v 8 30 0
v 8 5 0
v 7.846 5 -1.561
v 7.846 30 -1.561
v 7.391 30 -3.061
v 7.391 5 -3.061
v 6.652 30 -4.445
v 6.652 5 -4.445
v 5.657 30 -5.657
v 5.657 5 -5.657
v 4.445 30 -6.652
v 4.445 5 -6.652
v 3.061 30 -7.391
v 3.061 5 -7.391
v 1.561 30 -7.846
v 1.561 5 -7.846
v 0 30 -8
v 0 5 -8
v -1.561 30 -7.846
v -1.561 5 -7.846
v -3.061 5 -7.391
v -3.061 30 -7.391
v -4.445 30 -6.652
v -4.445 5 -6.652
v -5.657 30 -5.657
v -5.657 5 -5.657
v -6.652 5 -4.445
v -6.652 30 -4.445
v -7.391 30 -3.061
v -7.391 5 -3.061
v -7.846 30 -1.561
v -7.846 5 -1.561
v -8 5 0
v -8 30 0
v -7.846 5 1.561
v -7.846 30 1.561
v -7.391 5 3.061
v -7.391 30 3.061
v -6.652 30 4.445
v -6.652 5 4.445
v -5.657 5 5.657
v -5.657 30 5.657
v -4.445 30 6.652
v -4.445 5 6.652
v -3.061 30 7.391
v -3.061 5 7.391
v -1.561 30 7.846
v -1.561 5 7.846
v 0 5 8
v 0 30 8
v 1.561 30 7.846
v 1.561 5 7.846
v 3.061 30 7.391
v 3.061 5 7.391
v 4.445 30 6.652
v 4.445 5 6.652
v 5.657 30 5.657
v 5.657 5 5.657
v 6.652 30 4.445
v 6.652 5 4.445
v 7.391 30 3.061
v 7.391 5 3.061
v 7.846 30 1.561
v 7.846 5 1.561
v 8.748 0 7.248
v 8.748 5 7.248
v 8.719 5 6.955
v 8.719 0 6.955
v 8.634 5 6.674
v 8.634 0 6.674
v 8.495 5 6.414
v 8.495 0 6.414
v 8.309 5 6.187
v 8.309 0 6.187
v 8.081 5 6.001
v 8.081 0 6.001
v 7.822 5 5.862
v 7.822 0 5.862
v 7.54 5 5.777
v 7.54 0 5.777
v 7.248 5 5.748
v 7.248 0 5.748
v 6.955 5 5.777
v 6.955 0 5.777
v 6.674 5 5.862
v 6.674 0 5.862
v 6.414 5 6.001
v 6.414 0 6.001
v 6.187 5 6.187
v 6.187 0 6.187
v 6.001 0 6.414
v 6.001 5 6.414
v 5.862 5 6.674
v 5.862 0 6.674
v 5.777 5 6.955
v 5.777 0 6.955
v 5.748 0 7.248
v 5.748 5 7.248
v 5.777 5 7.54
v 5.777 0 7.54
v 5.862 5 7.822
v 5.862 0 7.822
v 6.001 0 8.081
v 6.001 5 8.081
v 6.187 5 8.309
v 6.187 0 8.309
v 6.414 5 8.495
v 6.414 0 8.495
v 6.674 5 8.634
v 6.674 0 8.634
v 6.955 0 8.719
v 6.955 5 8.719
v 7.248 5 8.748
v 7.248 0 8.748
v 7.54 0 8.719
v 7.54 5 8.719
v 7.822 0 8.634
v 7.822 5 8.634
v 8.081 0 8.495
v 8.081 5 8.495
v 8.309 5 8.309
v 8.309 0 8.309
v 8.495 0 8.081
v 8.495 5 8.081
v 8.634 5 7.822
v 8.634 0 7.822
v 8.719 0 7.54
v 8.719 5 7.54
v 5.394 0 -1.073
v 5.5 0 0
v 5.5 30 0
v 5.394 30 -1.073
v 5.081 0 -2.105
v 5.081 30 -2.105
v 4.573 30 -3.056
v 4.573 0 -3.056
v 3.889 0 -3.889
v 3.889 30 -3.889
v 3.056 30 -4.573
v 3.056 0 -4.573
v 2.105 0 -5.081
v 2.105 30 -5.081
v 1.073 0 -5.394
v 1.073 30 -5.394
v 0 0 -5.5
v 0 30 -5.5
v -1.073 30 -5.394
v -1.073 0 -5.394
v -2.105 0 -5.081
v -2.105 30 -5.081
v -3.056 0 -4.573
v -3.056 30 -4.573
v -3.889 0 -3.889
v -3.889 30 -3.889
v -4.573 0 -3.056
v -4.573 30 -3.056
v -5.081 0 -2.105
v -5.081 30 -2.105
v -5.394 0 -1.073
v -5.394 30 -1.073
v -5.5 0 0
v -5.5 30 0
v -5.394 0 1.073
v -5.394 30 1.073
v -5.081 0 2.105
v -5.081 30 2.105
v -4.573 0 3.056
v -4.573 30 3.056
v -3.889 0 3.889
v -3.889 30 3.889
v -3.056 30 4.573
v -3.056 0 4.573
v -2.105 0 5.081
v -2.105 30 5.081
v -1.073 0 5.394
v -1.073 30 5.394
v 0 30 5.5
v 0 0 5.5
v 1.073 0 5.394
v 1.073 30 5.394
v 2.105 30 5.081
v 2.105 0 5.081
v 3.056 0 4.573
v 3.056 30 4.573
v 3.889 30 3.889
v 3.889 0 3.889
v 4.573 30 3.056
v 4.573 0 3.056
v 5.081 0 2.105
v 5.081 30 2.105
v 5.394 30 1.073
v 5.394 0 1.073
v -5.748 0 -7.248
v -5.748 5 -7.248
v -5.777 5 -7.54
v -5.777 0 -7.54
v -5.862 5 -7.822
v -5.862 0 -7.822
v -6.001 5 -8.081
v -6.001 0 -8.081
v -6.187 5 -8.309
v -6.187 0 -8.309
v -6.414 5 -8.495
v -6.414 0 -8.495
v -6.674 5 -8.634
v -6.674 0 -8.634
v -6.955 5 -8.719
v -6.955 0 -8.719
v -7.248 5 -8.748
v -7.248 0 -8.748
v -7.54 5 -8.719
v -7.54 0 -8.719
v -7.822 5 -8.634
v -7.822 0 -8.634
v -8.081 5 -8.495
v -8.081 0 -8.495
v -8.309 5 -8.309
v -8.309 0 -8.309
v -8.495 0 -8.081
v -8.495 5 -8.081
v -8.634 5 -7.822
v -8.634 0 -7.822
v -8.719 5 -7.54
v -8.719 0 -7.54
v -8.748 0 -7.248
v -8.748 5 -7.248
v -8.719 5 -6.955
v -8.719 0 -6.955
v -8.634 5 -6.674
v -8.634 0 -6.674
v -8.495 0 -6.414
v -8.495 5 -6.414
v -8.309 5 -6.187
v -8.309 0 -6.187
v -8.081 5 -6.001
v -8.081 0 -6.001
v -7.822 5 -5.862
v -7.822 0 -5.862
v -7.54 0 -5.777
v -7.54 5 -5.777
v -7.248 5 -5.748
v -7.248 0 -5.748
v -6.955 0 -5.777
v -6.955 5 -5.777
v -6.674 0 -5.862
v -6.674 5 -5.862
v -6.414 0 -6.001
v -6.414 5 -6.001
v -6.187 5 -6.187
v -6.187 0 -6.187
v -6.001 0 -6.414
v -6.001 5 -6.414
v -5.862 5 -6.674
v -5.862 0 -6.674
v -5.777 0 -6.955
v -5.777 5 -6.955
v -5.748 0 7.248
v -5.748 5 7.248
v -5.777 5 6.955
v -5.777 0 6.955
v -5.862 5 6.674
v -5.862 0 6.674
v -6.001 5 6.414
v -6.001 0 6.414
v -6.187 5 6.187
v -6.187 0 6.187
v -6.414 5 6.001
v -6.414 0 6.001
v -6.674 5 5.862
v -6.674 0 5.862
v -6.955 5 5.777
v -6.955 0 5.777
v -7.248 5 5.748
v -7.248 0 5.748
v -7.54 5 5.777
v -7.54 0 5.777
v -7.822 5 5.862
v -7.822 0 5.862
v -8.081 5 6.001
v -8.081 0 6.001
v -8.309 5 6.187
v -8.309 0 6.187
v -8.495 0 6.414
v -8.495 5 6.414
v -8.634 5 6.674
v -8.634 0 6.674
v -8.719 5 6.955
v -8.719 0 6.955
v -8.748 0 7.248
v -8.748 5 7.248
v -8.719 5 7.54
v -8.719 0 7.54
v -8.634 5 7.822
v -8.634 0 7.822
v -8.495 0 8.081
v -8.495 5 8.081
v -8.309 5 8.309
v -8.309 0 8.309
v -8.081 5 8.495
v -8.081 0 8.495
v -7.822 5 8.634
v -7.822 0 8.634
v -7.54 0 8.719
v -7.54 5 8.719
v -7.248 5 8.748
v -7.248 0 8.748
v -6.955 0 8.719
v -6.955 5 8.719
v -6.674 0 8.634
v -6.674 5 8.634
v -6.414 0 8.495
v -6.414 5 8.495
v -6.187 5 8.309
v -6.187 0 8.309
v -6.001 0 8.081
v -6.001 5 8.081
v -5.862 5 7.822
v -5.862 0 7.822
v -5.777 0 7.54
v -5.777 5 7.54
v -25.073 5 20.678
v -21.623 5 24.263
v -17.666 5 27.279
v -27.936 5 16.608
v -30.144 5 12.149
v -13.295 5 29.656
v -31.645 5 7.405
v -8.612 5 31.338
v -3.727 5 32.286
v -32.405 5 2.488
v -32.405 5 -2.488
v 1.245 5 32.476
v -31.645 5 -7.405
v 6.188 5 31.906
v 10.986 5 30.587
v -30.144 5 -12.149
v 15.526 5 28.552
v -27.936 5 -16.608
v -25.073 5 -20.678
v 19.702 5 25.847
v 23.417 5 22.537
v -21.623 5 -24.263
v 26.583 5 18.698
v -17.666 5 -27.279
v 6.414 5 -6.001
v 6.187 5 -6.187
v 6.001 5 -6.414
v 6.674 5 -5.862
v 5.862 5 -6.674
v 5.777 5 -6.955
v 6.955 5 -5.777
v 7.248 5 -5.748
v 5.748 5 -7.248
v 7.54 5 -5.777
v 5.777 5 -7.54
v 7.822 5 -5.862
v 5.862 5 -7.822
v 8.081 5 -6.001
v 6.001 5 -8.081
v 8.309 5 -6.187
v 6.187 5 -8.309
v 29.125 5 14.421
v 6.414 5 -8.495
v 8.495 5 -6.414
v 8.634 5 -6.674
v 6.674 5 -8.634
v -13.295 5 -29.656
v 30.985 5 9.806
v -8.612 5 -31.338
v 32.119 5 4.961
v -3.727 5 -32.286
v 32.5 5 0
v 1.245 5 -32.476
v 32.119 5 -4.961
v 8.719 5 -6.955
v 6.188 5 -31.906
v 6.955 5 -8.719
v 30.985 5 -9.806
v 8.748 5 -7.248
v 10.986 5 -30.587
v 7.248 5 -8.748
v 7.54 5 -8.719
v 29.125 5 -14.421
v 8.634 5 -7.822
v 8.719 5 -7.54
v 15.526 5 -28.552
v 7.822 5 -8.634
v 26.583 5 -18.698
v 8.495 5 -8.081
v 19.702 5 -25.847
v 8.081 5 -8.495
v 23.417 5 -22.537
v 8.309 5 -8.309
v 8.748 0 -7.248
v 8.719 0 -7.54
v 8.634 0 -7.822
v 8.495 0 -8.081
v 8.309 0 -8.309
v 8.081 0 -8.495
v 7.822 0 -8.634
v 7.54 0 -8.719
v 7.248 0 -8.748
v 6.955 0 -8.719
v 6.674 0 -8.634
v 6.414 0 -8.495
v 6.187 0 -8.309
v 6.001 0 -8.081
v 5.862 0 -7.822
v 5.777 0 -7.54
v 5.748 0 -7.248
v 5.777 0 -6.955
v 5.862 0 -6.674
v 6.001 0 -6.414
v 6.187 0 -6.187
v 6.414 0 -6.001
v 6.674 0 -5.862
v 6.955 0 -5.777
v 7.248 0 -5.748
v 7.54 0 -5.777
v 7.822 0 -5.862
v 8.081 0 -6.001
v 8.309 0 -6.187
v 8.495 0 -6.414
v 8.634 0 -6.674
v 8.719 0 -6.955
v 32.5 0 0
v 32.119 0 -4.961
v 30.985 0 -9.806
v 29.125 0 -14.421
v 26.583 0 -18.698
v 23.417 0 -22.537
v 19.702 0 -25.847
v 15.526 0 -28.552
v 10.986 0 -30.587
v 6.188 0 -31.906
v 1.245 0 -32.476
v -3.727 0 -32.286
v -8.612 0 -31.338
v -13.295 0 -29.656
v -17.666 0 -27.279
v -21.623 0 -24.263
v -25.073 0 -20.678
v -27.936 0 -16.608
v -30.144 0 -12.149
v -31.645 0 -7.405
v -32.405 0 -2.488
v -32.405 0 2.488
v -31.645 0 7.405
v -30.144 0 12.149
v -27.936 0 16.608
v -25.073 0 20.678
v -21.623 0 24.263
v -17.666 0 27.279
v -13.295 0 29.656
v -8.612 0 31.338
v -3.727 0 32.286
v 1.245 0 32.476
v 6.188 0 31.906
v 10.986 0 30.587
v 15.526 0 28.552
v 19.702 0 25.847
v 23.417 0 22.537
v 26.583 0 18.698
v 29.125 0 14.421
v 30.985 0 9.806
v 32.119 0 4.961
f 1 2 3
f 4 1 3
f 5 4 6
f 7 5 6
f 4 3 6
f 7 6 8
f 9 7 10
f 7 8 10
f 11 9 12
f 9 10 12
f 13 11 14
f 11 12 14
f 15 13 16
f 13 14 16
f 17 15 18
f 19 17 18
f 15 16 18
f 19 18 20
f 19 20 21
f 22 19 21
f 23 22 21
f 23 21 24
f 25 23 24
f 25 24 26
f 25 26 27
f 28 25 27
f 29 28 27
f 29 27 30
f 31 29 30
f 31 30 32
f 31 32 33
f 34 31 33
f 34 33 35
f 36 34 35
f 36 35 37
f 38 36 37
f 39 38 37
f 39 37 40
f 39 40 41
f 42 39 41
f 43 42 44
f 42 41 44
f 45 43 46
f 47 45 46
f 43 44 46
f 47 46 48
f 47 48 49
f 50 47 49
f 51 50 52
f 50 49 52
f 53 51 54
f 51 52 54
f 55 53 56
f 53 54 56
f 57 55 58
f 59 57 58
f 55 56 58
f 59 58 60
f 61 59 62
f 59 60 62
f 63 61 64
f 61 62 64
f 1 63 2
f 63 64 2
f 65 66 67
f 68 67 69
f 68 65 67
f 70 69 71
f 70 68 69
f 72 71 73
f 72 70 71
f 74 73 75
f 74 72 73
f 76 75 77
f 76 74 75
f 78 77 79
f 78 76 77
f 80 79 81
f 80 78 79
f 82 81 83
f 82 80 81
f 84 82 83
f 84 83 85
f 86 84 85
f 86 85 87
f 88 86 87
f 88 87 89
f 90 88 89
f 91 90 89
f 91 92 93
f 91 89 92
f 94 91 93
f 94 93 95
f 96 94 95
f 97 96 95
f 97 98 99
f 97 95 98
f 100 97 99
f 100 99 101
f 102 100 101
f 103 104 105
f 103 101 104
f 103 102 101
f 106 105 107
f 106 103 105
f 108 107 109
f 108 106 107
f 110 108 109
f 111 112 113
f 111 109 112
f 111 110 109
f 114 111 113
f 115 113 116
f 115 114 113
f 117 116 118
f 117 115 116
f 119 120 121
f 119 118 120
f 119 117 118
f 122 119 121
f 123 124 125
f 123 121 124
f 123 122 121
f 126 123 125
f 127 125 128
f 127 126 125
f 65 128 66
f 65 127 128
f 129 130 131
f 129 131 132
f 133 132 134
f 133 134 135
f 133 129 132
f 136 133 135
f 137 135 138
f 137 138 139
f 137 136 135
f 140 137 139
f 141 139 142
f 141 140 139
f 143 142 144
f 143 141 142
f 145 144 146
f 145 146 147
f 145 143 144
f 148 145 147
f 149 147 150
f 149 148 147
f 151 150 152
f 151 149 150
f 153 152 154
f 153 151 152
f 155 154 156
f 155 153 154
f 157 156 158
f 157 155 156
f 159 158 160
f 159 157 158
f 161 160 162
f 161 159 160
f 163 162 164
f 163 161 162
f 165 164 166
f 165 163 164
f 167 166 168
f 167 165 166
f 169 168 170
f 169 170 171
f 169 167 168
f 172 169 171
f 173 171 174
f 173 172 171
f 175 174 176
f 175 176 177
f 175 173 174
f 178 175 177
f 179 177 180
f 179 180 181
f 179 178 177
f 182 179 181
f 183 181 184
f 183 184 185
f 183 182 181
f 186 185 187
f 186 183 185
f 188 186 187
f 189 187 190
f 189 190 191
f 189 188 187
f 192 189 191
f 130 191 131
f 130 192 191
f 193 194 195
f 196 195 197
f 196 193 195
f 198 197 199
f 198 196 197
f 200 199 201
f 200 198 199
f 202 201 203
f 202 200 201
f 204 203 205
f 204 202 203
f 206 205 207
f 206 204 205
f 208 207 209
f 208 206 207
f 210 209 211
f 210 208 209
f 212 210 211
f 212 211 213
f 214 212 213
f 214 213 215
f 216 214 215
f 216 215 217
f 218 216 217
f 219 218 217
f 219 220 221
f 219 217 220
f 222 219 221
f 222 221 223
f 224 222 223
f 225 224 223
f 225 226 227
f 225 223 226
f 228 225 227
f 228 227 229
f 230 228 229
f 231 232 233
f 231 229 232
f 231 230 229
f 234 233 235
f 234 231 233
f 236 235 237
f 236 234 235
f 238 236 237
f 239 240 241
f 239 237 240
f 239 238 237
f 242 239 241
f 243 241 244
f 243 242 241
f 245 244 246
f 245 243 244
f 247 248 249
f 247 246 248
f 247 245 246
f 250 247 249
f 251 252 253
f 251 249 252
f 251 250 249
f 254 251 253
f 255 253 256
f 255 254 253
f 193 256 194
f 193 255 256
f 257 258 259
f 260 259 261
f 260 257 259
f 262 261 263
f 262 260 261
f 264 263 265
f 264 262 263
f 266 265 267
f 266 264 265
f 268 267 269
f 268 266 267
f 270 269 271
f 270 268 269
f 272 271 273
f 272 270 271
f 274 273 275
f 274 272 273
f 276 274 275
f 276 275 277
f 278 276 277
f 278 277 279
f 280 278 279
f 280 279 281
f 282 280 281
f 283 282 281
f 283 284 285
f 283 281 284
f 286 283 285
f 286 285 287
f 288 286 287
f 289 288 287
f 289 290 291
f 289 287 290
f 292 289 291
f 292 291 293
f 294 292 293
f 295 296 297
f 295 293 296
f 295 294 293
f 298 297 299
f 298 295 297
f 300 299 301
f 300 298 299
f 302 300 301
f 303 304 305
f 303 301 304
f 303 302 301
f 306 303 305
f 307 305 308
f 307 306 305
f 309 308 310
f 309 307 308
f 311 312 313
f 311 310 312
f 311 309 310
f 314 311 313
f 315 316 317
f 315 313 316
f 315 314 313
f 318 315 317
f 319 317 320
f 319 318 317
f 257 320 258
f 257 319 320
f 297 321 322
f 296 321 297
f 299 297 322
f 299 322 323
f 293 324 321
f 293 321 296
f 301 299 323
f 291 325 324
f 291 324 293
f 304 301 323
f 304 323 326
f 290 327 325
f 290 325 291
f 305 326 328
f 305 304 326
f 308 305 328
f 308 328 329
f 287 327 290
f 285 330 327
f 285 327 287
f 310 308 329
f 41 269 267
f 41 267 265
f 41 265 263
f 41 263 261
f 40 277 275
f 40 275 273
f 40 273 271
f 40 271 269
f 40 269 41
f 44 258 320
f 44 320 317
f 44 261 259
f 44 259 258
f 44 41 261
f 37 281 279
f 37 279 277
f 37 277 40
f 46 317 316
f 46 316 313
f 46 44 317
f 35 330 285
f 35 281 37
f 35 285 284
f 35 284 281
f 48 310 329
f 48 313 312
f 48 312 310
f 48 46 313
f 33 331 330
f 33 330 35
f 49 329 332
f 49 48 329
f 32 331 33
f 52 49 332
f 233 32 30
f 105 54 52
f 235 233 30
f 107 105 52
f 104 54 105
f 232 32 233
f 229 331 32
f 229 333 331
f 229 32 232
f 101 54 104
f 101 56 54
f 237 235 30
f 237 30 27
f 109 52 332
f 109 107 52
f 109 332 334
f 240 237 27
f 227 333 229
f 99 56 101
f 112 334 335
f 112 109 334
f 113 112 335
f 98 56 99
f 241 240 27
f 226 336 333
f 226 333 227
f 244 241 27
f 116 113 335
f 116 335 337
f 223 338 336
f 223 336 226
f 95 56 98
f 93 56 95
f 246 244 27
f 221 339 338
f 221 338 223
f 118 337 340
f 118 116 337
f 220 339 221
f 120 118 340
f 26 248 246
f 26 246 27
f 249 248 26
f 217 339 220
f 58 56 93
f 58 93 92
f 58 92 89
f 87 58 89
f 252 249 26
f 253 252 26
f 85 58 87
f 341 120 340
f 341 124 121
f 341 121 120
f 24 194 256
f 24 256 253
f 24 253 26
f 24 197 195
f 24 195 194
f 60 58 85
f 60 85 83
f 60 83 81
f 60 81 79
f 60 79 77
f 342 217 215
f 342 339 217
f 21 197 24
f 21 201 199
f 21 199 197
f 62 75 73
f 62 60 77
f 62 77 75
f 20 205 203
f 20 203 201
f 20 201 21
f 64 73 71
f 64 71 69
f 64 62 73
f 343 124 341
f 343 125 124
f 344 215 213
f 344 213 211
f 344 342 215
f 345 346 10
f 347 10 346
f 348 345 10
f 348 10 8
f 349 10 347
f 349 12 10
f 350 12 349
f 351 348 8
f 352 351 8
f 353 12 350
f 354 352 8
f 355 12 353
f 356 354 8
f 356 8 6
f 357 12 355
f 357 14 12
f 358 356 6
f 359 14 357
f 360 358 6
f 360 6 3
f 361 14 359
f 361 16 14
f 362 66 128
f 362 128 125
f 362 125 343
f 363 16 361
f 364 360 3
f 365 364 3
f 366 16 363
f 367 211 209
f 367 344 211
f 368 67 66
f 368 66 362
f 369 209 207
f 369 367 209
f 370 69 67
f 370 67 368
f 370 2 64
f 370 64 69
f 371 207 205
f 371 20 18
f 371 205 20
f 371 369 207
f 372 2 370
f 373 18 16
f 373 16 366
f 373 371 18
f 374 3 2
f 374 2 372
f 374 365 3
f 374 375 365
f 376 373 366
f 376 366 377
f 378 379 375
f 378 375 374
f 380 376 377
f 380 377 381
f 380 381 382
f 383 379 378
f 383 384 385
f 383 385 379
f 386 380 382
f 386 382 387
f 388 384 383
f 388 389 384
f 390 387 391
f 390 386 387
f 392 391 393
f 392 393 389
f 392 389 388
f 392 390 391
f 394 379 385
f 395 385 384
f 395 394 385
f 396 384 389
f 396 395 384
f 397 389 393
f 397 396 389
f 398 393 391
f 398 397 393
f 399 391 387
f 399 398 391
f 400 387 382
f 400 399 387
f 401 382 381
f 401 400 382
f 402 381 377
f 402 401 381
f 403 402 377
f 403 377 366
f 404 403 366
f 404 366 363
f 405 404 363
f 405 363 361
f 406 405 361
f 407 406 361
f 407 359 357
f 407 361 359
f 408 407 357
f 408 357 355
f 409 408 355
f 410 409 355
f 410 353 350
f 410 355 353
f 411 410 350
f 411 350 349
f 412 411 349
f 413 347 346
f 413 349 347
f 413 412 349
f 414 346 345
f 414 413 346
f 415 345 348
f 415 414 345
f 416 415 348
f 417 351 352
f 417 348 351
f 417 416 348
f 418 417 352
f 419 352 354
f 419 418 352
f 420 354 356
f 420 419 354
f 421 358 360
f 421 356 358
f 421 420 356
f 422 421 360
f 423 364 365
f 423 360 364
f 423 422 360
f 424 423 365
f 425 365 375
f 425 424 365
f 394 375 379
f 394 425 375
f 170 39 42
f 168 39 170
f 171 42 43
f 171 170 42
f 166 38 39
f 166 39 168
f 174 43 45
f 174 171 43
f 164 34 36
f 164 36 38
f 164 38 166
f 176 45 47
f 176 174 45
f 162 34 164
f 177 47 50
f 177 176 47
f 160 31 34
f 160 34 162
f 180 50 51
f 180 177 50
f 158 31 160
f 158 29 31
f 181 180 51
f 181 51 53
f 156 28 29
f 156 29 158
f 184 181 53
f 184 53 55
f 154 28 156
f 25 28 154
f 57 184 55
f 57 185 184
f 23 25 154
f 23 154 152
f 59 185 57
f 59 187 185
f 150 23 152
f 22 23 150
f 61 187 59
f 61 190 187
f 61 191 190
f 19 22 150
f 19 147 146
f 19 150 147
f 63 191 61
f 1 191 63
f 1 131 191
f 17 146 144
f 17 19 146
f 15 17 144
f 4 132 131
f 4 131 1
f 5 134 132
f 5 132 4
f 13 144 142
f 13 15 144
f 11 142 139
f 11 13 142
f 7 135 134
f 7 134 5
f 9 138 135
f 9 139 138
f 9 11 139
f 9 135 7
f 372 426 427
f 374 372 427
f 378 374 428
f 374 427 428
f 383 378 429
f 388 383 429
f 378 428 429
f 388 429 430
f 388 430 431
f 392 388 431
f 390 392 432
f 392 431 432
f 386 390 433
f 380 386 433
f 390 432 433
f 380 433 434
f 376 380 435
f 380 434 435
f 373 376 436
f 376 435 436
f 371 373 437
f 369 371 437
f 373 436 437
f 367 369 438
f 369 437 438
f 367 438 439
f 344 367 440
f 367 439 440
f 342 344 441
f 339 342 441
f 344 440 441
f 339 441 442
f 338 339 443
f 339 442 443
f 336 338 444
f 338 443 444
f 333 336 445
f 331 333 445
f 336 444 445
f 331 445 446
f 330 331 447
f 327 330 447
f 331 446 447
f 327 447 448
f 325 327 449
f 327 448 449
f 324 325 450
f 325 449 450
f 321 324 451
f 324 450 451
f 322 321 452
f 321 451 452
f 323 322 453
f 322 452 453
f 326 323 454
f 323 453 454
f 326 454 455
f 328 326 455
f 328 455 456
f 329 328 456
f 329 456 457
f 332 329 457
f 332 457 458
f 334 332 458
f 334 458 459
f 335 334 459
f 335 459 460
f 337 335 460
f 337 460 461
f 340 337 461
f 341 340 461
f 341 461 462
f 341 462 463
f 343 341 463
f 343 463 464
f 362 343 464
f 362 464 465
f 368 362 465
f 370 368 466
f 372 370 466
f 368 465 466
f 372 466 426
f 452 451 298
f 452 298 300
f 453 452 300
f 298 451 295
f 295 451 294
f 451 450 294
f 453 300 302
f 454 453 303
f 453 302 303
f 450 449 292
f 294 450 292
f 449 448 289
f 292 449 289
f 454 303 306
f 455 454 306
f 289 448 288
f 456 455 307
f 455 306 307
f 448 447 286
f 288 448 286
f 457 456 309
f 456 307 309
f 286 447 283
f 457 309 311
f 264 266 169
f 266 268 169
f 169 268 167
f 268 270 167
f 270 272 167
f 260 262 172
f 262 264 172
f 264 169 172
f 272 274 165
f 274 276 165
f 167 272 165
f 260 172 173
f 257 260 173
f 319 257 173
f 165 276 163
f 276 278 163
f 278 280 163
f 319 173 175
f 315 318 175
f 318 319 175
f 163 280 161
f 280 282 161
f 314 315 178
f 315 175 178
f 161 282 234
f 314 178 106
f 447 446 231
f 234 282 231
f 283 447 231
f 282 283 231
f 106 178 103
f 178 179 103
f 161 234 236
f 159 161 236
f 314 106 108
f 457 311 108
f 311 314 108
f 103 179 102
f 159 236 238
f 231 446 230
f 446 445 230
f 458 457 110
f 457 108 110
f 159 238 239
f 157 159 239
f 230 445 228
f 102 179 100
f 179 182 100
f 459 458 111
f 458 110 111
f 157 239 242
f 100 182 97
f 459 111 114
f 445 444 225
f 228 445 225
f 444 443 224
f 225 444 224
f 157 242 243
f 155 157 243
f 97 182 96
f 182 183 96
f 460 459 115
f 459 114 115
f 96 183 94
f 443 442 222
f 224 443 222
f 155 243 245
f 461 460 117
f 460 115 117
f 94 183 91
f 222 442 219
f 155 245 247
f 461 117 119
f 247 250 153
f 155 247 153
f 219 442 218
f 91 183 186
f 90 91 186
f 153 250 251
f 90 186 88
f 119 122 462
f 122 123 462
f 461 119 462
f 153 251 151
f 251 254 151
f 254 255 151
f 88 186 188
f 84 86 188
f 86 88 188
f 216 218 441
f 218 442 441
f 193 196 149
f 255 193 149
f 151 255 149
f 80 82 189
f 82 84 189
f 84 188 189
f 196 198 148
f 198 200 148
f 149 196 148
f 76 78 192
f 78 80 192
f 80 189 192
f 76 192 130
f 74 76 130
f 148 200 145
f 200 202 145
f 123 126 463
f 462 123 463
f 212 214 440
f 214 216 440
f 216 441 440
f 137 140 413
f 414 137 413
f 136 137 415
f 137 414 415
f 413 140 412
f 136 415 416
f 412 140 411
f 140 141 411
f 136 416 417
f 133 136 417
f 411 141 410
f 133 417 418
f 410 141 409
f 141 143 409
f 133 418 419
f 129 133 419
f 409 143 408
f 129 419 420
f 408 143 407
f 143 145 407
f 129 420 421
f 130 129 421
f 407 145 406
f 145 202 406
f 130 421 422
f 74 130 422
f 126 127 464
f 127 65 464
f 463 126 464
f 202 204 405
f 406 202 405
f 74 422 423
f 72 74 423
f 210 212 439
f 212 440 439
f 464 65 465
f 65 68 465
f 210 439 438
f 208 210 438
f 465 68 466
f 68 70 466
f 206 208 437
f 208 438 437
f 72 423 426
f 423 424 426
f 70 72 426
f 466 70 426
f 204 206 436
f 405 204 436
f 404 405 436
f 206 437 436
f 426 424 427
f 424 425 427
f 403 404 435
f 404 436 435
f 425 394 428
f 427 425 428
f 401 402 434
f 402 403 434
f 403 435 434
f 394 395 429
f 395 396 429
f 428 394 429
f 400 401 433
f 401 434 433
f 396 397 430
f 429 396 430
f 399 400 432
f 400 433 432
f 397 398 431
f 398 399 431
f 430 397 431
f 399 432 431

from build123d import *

# Parameters (mm, degrees)
SKETCH1_R           = 32.5
SKETCH1_R_2         = 17.5
SKETCH1_R_3         = 12.5
SKETCH1_R_4         = 8
BOSS_EXTRUDE1_DEPTH = 5
SKETCH2_R           = 1.5
CUT_EXTRUDE1_DEPTH  = 10
SKETCH3_R           = 8
SKETCH3_R_2         = 5.5
BOSS_EXTRUDE3_DEPTH = 30


with BuildPart() as part:
    # Sketch1 → Boss-Extrude1 (new body)
    with BuildSketch(Plane(origin=(0, 0, 0), x_dir=(1, 0, 0), z_dir=(0, 1, 0))):
        Circle(SKETCH1_R)
        Circle(SKETCH1_R_2, mode=Mode.SUBTRACT)
        Circle(SKETCH1_R_2)
        Circle(SKETCH1_R_3, mode=Mode.SUBTRACT)
        Circle(SKETCH1_R_3)
        Circle(SKETCH1_R_4, mode=Mode.SUBTRACT)
    extrude(amount=BOSS_EXTRUDE1_DEPTH)

    # Sketch2 → Cut-Extrude1 (cut)
    with BuildSketch(Plane(origin=(0, 0, 0), x_dir=(1, 0, 0), z_dir=(0, 1, 0))):
        with Locations((-7.247844507, 7.247844507)):
            Circle(SKETCH2_R)
        with Locations((7.247844507, 7.247844507)):
            Circle(SKETCH2_R)
        with Locations((7.247844507, -7.247844507)):
            Circle(SKETCH2_R)
        with Locations((-7.247844507, -7.247844507)):
            Circle(SKETCH2_R)
    extrude(amount=CUT_EXTRUDE1_DEPTH, mode=Mode.SUBTRACT)

    # Sketch3 → Boss-Extrude3 (add)
    with BuildSketch(Plane(origin=(0, 0, 0), x_dir=(1, 0, 0), z_dir=(0, 1, 0))):
        Circle(SKETCH3_R)
        Circle(SKETCH3_R_2, mode=Mode.SUBTRACT)
    extrude(amount=BOSS_EXTRUDE3_DEPTH)


solid = part.part
